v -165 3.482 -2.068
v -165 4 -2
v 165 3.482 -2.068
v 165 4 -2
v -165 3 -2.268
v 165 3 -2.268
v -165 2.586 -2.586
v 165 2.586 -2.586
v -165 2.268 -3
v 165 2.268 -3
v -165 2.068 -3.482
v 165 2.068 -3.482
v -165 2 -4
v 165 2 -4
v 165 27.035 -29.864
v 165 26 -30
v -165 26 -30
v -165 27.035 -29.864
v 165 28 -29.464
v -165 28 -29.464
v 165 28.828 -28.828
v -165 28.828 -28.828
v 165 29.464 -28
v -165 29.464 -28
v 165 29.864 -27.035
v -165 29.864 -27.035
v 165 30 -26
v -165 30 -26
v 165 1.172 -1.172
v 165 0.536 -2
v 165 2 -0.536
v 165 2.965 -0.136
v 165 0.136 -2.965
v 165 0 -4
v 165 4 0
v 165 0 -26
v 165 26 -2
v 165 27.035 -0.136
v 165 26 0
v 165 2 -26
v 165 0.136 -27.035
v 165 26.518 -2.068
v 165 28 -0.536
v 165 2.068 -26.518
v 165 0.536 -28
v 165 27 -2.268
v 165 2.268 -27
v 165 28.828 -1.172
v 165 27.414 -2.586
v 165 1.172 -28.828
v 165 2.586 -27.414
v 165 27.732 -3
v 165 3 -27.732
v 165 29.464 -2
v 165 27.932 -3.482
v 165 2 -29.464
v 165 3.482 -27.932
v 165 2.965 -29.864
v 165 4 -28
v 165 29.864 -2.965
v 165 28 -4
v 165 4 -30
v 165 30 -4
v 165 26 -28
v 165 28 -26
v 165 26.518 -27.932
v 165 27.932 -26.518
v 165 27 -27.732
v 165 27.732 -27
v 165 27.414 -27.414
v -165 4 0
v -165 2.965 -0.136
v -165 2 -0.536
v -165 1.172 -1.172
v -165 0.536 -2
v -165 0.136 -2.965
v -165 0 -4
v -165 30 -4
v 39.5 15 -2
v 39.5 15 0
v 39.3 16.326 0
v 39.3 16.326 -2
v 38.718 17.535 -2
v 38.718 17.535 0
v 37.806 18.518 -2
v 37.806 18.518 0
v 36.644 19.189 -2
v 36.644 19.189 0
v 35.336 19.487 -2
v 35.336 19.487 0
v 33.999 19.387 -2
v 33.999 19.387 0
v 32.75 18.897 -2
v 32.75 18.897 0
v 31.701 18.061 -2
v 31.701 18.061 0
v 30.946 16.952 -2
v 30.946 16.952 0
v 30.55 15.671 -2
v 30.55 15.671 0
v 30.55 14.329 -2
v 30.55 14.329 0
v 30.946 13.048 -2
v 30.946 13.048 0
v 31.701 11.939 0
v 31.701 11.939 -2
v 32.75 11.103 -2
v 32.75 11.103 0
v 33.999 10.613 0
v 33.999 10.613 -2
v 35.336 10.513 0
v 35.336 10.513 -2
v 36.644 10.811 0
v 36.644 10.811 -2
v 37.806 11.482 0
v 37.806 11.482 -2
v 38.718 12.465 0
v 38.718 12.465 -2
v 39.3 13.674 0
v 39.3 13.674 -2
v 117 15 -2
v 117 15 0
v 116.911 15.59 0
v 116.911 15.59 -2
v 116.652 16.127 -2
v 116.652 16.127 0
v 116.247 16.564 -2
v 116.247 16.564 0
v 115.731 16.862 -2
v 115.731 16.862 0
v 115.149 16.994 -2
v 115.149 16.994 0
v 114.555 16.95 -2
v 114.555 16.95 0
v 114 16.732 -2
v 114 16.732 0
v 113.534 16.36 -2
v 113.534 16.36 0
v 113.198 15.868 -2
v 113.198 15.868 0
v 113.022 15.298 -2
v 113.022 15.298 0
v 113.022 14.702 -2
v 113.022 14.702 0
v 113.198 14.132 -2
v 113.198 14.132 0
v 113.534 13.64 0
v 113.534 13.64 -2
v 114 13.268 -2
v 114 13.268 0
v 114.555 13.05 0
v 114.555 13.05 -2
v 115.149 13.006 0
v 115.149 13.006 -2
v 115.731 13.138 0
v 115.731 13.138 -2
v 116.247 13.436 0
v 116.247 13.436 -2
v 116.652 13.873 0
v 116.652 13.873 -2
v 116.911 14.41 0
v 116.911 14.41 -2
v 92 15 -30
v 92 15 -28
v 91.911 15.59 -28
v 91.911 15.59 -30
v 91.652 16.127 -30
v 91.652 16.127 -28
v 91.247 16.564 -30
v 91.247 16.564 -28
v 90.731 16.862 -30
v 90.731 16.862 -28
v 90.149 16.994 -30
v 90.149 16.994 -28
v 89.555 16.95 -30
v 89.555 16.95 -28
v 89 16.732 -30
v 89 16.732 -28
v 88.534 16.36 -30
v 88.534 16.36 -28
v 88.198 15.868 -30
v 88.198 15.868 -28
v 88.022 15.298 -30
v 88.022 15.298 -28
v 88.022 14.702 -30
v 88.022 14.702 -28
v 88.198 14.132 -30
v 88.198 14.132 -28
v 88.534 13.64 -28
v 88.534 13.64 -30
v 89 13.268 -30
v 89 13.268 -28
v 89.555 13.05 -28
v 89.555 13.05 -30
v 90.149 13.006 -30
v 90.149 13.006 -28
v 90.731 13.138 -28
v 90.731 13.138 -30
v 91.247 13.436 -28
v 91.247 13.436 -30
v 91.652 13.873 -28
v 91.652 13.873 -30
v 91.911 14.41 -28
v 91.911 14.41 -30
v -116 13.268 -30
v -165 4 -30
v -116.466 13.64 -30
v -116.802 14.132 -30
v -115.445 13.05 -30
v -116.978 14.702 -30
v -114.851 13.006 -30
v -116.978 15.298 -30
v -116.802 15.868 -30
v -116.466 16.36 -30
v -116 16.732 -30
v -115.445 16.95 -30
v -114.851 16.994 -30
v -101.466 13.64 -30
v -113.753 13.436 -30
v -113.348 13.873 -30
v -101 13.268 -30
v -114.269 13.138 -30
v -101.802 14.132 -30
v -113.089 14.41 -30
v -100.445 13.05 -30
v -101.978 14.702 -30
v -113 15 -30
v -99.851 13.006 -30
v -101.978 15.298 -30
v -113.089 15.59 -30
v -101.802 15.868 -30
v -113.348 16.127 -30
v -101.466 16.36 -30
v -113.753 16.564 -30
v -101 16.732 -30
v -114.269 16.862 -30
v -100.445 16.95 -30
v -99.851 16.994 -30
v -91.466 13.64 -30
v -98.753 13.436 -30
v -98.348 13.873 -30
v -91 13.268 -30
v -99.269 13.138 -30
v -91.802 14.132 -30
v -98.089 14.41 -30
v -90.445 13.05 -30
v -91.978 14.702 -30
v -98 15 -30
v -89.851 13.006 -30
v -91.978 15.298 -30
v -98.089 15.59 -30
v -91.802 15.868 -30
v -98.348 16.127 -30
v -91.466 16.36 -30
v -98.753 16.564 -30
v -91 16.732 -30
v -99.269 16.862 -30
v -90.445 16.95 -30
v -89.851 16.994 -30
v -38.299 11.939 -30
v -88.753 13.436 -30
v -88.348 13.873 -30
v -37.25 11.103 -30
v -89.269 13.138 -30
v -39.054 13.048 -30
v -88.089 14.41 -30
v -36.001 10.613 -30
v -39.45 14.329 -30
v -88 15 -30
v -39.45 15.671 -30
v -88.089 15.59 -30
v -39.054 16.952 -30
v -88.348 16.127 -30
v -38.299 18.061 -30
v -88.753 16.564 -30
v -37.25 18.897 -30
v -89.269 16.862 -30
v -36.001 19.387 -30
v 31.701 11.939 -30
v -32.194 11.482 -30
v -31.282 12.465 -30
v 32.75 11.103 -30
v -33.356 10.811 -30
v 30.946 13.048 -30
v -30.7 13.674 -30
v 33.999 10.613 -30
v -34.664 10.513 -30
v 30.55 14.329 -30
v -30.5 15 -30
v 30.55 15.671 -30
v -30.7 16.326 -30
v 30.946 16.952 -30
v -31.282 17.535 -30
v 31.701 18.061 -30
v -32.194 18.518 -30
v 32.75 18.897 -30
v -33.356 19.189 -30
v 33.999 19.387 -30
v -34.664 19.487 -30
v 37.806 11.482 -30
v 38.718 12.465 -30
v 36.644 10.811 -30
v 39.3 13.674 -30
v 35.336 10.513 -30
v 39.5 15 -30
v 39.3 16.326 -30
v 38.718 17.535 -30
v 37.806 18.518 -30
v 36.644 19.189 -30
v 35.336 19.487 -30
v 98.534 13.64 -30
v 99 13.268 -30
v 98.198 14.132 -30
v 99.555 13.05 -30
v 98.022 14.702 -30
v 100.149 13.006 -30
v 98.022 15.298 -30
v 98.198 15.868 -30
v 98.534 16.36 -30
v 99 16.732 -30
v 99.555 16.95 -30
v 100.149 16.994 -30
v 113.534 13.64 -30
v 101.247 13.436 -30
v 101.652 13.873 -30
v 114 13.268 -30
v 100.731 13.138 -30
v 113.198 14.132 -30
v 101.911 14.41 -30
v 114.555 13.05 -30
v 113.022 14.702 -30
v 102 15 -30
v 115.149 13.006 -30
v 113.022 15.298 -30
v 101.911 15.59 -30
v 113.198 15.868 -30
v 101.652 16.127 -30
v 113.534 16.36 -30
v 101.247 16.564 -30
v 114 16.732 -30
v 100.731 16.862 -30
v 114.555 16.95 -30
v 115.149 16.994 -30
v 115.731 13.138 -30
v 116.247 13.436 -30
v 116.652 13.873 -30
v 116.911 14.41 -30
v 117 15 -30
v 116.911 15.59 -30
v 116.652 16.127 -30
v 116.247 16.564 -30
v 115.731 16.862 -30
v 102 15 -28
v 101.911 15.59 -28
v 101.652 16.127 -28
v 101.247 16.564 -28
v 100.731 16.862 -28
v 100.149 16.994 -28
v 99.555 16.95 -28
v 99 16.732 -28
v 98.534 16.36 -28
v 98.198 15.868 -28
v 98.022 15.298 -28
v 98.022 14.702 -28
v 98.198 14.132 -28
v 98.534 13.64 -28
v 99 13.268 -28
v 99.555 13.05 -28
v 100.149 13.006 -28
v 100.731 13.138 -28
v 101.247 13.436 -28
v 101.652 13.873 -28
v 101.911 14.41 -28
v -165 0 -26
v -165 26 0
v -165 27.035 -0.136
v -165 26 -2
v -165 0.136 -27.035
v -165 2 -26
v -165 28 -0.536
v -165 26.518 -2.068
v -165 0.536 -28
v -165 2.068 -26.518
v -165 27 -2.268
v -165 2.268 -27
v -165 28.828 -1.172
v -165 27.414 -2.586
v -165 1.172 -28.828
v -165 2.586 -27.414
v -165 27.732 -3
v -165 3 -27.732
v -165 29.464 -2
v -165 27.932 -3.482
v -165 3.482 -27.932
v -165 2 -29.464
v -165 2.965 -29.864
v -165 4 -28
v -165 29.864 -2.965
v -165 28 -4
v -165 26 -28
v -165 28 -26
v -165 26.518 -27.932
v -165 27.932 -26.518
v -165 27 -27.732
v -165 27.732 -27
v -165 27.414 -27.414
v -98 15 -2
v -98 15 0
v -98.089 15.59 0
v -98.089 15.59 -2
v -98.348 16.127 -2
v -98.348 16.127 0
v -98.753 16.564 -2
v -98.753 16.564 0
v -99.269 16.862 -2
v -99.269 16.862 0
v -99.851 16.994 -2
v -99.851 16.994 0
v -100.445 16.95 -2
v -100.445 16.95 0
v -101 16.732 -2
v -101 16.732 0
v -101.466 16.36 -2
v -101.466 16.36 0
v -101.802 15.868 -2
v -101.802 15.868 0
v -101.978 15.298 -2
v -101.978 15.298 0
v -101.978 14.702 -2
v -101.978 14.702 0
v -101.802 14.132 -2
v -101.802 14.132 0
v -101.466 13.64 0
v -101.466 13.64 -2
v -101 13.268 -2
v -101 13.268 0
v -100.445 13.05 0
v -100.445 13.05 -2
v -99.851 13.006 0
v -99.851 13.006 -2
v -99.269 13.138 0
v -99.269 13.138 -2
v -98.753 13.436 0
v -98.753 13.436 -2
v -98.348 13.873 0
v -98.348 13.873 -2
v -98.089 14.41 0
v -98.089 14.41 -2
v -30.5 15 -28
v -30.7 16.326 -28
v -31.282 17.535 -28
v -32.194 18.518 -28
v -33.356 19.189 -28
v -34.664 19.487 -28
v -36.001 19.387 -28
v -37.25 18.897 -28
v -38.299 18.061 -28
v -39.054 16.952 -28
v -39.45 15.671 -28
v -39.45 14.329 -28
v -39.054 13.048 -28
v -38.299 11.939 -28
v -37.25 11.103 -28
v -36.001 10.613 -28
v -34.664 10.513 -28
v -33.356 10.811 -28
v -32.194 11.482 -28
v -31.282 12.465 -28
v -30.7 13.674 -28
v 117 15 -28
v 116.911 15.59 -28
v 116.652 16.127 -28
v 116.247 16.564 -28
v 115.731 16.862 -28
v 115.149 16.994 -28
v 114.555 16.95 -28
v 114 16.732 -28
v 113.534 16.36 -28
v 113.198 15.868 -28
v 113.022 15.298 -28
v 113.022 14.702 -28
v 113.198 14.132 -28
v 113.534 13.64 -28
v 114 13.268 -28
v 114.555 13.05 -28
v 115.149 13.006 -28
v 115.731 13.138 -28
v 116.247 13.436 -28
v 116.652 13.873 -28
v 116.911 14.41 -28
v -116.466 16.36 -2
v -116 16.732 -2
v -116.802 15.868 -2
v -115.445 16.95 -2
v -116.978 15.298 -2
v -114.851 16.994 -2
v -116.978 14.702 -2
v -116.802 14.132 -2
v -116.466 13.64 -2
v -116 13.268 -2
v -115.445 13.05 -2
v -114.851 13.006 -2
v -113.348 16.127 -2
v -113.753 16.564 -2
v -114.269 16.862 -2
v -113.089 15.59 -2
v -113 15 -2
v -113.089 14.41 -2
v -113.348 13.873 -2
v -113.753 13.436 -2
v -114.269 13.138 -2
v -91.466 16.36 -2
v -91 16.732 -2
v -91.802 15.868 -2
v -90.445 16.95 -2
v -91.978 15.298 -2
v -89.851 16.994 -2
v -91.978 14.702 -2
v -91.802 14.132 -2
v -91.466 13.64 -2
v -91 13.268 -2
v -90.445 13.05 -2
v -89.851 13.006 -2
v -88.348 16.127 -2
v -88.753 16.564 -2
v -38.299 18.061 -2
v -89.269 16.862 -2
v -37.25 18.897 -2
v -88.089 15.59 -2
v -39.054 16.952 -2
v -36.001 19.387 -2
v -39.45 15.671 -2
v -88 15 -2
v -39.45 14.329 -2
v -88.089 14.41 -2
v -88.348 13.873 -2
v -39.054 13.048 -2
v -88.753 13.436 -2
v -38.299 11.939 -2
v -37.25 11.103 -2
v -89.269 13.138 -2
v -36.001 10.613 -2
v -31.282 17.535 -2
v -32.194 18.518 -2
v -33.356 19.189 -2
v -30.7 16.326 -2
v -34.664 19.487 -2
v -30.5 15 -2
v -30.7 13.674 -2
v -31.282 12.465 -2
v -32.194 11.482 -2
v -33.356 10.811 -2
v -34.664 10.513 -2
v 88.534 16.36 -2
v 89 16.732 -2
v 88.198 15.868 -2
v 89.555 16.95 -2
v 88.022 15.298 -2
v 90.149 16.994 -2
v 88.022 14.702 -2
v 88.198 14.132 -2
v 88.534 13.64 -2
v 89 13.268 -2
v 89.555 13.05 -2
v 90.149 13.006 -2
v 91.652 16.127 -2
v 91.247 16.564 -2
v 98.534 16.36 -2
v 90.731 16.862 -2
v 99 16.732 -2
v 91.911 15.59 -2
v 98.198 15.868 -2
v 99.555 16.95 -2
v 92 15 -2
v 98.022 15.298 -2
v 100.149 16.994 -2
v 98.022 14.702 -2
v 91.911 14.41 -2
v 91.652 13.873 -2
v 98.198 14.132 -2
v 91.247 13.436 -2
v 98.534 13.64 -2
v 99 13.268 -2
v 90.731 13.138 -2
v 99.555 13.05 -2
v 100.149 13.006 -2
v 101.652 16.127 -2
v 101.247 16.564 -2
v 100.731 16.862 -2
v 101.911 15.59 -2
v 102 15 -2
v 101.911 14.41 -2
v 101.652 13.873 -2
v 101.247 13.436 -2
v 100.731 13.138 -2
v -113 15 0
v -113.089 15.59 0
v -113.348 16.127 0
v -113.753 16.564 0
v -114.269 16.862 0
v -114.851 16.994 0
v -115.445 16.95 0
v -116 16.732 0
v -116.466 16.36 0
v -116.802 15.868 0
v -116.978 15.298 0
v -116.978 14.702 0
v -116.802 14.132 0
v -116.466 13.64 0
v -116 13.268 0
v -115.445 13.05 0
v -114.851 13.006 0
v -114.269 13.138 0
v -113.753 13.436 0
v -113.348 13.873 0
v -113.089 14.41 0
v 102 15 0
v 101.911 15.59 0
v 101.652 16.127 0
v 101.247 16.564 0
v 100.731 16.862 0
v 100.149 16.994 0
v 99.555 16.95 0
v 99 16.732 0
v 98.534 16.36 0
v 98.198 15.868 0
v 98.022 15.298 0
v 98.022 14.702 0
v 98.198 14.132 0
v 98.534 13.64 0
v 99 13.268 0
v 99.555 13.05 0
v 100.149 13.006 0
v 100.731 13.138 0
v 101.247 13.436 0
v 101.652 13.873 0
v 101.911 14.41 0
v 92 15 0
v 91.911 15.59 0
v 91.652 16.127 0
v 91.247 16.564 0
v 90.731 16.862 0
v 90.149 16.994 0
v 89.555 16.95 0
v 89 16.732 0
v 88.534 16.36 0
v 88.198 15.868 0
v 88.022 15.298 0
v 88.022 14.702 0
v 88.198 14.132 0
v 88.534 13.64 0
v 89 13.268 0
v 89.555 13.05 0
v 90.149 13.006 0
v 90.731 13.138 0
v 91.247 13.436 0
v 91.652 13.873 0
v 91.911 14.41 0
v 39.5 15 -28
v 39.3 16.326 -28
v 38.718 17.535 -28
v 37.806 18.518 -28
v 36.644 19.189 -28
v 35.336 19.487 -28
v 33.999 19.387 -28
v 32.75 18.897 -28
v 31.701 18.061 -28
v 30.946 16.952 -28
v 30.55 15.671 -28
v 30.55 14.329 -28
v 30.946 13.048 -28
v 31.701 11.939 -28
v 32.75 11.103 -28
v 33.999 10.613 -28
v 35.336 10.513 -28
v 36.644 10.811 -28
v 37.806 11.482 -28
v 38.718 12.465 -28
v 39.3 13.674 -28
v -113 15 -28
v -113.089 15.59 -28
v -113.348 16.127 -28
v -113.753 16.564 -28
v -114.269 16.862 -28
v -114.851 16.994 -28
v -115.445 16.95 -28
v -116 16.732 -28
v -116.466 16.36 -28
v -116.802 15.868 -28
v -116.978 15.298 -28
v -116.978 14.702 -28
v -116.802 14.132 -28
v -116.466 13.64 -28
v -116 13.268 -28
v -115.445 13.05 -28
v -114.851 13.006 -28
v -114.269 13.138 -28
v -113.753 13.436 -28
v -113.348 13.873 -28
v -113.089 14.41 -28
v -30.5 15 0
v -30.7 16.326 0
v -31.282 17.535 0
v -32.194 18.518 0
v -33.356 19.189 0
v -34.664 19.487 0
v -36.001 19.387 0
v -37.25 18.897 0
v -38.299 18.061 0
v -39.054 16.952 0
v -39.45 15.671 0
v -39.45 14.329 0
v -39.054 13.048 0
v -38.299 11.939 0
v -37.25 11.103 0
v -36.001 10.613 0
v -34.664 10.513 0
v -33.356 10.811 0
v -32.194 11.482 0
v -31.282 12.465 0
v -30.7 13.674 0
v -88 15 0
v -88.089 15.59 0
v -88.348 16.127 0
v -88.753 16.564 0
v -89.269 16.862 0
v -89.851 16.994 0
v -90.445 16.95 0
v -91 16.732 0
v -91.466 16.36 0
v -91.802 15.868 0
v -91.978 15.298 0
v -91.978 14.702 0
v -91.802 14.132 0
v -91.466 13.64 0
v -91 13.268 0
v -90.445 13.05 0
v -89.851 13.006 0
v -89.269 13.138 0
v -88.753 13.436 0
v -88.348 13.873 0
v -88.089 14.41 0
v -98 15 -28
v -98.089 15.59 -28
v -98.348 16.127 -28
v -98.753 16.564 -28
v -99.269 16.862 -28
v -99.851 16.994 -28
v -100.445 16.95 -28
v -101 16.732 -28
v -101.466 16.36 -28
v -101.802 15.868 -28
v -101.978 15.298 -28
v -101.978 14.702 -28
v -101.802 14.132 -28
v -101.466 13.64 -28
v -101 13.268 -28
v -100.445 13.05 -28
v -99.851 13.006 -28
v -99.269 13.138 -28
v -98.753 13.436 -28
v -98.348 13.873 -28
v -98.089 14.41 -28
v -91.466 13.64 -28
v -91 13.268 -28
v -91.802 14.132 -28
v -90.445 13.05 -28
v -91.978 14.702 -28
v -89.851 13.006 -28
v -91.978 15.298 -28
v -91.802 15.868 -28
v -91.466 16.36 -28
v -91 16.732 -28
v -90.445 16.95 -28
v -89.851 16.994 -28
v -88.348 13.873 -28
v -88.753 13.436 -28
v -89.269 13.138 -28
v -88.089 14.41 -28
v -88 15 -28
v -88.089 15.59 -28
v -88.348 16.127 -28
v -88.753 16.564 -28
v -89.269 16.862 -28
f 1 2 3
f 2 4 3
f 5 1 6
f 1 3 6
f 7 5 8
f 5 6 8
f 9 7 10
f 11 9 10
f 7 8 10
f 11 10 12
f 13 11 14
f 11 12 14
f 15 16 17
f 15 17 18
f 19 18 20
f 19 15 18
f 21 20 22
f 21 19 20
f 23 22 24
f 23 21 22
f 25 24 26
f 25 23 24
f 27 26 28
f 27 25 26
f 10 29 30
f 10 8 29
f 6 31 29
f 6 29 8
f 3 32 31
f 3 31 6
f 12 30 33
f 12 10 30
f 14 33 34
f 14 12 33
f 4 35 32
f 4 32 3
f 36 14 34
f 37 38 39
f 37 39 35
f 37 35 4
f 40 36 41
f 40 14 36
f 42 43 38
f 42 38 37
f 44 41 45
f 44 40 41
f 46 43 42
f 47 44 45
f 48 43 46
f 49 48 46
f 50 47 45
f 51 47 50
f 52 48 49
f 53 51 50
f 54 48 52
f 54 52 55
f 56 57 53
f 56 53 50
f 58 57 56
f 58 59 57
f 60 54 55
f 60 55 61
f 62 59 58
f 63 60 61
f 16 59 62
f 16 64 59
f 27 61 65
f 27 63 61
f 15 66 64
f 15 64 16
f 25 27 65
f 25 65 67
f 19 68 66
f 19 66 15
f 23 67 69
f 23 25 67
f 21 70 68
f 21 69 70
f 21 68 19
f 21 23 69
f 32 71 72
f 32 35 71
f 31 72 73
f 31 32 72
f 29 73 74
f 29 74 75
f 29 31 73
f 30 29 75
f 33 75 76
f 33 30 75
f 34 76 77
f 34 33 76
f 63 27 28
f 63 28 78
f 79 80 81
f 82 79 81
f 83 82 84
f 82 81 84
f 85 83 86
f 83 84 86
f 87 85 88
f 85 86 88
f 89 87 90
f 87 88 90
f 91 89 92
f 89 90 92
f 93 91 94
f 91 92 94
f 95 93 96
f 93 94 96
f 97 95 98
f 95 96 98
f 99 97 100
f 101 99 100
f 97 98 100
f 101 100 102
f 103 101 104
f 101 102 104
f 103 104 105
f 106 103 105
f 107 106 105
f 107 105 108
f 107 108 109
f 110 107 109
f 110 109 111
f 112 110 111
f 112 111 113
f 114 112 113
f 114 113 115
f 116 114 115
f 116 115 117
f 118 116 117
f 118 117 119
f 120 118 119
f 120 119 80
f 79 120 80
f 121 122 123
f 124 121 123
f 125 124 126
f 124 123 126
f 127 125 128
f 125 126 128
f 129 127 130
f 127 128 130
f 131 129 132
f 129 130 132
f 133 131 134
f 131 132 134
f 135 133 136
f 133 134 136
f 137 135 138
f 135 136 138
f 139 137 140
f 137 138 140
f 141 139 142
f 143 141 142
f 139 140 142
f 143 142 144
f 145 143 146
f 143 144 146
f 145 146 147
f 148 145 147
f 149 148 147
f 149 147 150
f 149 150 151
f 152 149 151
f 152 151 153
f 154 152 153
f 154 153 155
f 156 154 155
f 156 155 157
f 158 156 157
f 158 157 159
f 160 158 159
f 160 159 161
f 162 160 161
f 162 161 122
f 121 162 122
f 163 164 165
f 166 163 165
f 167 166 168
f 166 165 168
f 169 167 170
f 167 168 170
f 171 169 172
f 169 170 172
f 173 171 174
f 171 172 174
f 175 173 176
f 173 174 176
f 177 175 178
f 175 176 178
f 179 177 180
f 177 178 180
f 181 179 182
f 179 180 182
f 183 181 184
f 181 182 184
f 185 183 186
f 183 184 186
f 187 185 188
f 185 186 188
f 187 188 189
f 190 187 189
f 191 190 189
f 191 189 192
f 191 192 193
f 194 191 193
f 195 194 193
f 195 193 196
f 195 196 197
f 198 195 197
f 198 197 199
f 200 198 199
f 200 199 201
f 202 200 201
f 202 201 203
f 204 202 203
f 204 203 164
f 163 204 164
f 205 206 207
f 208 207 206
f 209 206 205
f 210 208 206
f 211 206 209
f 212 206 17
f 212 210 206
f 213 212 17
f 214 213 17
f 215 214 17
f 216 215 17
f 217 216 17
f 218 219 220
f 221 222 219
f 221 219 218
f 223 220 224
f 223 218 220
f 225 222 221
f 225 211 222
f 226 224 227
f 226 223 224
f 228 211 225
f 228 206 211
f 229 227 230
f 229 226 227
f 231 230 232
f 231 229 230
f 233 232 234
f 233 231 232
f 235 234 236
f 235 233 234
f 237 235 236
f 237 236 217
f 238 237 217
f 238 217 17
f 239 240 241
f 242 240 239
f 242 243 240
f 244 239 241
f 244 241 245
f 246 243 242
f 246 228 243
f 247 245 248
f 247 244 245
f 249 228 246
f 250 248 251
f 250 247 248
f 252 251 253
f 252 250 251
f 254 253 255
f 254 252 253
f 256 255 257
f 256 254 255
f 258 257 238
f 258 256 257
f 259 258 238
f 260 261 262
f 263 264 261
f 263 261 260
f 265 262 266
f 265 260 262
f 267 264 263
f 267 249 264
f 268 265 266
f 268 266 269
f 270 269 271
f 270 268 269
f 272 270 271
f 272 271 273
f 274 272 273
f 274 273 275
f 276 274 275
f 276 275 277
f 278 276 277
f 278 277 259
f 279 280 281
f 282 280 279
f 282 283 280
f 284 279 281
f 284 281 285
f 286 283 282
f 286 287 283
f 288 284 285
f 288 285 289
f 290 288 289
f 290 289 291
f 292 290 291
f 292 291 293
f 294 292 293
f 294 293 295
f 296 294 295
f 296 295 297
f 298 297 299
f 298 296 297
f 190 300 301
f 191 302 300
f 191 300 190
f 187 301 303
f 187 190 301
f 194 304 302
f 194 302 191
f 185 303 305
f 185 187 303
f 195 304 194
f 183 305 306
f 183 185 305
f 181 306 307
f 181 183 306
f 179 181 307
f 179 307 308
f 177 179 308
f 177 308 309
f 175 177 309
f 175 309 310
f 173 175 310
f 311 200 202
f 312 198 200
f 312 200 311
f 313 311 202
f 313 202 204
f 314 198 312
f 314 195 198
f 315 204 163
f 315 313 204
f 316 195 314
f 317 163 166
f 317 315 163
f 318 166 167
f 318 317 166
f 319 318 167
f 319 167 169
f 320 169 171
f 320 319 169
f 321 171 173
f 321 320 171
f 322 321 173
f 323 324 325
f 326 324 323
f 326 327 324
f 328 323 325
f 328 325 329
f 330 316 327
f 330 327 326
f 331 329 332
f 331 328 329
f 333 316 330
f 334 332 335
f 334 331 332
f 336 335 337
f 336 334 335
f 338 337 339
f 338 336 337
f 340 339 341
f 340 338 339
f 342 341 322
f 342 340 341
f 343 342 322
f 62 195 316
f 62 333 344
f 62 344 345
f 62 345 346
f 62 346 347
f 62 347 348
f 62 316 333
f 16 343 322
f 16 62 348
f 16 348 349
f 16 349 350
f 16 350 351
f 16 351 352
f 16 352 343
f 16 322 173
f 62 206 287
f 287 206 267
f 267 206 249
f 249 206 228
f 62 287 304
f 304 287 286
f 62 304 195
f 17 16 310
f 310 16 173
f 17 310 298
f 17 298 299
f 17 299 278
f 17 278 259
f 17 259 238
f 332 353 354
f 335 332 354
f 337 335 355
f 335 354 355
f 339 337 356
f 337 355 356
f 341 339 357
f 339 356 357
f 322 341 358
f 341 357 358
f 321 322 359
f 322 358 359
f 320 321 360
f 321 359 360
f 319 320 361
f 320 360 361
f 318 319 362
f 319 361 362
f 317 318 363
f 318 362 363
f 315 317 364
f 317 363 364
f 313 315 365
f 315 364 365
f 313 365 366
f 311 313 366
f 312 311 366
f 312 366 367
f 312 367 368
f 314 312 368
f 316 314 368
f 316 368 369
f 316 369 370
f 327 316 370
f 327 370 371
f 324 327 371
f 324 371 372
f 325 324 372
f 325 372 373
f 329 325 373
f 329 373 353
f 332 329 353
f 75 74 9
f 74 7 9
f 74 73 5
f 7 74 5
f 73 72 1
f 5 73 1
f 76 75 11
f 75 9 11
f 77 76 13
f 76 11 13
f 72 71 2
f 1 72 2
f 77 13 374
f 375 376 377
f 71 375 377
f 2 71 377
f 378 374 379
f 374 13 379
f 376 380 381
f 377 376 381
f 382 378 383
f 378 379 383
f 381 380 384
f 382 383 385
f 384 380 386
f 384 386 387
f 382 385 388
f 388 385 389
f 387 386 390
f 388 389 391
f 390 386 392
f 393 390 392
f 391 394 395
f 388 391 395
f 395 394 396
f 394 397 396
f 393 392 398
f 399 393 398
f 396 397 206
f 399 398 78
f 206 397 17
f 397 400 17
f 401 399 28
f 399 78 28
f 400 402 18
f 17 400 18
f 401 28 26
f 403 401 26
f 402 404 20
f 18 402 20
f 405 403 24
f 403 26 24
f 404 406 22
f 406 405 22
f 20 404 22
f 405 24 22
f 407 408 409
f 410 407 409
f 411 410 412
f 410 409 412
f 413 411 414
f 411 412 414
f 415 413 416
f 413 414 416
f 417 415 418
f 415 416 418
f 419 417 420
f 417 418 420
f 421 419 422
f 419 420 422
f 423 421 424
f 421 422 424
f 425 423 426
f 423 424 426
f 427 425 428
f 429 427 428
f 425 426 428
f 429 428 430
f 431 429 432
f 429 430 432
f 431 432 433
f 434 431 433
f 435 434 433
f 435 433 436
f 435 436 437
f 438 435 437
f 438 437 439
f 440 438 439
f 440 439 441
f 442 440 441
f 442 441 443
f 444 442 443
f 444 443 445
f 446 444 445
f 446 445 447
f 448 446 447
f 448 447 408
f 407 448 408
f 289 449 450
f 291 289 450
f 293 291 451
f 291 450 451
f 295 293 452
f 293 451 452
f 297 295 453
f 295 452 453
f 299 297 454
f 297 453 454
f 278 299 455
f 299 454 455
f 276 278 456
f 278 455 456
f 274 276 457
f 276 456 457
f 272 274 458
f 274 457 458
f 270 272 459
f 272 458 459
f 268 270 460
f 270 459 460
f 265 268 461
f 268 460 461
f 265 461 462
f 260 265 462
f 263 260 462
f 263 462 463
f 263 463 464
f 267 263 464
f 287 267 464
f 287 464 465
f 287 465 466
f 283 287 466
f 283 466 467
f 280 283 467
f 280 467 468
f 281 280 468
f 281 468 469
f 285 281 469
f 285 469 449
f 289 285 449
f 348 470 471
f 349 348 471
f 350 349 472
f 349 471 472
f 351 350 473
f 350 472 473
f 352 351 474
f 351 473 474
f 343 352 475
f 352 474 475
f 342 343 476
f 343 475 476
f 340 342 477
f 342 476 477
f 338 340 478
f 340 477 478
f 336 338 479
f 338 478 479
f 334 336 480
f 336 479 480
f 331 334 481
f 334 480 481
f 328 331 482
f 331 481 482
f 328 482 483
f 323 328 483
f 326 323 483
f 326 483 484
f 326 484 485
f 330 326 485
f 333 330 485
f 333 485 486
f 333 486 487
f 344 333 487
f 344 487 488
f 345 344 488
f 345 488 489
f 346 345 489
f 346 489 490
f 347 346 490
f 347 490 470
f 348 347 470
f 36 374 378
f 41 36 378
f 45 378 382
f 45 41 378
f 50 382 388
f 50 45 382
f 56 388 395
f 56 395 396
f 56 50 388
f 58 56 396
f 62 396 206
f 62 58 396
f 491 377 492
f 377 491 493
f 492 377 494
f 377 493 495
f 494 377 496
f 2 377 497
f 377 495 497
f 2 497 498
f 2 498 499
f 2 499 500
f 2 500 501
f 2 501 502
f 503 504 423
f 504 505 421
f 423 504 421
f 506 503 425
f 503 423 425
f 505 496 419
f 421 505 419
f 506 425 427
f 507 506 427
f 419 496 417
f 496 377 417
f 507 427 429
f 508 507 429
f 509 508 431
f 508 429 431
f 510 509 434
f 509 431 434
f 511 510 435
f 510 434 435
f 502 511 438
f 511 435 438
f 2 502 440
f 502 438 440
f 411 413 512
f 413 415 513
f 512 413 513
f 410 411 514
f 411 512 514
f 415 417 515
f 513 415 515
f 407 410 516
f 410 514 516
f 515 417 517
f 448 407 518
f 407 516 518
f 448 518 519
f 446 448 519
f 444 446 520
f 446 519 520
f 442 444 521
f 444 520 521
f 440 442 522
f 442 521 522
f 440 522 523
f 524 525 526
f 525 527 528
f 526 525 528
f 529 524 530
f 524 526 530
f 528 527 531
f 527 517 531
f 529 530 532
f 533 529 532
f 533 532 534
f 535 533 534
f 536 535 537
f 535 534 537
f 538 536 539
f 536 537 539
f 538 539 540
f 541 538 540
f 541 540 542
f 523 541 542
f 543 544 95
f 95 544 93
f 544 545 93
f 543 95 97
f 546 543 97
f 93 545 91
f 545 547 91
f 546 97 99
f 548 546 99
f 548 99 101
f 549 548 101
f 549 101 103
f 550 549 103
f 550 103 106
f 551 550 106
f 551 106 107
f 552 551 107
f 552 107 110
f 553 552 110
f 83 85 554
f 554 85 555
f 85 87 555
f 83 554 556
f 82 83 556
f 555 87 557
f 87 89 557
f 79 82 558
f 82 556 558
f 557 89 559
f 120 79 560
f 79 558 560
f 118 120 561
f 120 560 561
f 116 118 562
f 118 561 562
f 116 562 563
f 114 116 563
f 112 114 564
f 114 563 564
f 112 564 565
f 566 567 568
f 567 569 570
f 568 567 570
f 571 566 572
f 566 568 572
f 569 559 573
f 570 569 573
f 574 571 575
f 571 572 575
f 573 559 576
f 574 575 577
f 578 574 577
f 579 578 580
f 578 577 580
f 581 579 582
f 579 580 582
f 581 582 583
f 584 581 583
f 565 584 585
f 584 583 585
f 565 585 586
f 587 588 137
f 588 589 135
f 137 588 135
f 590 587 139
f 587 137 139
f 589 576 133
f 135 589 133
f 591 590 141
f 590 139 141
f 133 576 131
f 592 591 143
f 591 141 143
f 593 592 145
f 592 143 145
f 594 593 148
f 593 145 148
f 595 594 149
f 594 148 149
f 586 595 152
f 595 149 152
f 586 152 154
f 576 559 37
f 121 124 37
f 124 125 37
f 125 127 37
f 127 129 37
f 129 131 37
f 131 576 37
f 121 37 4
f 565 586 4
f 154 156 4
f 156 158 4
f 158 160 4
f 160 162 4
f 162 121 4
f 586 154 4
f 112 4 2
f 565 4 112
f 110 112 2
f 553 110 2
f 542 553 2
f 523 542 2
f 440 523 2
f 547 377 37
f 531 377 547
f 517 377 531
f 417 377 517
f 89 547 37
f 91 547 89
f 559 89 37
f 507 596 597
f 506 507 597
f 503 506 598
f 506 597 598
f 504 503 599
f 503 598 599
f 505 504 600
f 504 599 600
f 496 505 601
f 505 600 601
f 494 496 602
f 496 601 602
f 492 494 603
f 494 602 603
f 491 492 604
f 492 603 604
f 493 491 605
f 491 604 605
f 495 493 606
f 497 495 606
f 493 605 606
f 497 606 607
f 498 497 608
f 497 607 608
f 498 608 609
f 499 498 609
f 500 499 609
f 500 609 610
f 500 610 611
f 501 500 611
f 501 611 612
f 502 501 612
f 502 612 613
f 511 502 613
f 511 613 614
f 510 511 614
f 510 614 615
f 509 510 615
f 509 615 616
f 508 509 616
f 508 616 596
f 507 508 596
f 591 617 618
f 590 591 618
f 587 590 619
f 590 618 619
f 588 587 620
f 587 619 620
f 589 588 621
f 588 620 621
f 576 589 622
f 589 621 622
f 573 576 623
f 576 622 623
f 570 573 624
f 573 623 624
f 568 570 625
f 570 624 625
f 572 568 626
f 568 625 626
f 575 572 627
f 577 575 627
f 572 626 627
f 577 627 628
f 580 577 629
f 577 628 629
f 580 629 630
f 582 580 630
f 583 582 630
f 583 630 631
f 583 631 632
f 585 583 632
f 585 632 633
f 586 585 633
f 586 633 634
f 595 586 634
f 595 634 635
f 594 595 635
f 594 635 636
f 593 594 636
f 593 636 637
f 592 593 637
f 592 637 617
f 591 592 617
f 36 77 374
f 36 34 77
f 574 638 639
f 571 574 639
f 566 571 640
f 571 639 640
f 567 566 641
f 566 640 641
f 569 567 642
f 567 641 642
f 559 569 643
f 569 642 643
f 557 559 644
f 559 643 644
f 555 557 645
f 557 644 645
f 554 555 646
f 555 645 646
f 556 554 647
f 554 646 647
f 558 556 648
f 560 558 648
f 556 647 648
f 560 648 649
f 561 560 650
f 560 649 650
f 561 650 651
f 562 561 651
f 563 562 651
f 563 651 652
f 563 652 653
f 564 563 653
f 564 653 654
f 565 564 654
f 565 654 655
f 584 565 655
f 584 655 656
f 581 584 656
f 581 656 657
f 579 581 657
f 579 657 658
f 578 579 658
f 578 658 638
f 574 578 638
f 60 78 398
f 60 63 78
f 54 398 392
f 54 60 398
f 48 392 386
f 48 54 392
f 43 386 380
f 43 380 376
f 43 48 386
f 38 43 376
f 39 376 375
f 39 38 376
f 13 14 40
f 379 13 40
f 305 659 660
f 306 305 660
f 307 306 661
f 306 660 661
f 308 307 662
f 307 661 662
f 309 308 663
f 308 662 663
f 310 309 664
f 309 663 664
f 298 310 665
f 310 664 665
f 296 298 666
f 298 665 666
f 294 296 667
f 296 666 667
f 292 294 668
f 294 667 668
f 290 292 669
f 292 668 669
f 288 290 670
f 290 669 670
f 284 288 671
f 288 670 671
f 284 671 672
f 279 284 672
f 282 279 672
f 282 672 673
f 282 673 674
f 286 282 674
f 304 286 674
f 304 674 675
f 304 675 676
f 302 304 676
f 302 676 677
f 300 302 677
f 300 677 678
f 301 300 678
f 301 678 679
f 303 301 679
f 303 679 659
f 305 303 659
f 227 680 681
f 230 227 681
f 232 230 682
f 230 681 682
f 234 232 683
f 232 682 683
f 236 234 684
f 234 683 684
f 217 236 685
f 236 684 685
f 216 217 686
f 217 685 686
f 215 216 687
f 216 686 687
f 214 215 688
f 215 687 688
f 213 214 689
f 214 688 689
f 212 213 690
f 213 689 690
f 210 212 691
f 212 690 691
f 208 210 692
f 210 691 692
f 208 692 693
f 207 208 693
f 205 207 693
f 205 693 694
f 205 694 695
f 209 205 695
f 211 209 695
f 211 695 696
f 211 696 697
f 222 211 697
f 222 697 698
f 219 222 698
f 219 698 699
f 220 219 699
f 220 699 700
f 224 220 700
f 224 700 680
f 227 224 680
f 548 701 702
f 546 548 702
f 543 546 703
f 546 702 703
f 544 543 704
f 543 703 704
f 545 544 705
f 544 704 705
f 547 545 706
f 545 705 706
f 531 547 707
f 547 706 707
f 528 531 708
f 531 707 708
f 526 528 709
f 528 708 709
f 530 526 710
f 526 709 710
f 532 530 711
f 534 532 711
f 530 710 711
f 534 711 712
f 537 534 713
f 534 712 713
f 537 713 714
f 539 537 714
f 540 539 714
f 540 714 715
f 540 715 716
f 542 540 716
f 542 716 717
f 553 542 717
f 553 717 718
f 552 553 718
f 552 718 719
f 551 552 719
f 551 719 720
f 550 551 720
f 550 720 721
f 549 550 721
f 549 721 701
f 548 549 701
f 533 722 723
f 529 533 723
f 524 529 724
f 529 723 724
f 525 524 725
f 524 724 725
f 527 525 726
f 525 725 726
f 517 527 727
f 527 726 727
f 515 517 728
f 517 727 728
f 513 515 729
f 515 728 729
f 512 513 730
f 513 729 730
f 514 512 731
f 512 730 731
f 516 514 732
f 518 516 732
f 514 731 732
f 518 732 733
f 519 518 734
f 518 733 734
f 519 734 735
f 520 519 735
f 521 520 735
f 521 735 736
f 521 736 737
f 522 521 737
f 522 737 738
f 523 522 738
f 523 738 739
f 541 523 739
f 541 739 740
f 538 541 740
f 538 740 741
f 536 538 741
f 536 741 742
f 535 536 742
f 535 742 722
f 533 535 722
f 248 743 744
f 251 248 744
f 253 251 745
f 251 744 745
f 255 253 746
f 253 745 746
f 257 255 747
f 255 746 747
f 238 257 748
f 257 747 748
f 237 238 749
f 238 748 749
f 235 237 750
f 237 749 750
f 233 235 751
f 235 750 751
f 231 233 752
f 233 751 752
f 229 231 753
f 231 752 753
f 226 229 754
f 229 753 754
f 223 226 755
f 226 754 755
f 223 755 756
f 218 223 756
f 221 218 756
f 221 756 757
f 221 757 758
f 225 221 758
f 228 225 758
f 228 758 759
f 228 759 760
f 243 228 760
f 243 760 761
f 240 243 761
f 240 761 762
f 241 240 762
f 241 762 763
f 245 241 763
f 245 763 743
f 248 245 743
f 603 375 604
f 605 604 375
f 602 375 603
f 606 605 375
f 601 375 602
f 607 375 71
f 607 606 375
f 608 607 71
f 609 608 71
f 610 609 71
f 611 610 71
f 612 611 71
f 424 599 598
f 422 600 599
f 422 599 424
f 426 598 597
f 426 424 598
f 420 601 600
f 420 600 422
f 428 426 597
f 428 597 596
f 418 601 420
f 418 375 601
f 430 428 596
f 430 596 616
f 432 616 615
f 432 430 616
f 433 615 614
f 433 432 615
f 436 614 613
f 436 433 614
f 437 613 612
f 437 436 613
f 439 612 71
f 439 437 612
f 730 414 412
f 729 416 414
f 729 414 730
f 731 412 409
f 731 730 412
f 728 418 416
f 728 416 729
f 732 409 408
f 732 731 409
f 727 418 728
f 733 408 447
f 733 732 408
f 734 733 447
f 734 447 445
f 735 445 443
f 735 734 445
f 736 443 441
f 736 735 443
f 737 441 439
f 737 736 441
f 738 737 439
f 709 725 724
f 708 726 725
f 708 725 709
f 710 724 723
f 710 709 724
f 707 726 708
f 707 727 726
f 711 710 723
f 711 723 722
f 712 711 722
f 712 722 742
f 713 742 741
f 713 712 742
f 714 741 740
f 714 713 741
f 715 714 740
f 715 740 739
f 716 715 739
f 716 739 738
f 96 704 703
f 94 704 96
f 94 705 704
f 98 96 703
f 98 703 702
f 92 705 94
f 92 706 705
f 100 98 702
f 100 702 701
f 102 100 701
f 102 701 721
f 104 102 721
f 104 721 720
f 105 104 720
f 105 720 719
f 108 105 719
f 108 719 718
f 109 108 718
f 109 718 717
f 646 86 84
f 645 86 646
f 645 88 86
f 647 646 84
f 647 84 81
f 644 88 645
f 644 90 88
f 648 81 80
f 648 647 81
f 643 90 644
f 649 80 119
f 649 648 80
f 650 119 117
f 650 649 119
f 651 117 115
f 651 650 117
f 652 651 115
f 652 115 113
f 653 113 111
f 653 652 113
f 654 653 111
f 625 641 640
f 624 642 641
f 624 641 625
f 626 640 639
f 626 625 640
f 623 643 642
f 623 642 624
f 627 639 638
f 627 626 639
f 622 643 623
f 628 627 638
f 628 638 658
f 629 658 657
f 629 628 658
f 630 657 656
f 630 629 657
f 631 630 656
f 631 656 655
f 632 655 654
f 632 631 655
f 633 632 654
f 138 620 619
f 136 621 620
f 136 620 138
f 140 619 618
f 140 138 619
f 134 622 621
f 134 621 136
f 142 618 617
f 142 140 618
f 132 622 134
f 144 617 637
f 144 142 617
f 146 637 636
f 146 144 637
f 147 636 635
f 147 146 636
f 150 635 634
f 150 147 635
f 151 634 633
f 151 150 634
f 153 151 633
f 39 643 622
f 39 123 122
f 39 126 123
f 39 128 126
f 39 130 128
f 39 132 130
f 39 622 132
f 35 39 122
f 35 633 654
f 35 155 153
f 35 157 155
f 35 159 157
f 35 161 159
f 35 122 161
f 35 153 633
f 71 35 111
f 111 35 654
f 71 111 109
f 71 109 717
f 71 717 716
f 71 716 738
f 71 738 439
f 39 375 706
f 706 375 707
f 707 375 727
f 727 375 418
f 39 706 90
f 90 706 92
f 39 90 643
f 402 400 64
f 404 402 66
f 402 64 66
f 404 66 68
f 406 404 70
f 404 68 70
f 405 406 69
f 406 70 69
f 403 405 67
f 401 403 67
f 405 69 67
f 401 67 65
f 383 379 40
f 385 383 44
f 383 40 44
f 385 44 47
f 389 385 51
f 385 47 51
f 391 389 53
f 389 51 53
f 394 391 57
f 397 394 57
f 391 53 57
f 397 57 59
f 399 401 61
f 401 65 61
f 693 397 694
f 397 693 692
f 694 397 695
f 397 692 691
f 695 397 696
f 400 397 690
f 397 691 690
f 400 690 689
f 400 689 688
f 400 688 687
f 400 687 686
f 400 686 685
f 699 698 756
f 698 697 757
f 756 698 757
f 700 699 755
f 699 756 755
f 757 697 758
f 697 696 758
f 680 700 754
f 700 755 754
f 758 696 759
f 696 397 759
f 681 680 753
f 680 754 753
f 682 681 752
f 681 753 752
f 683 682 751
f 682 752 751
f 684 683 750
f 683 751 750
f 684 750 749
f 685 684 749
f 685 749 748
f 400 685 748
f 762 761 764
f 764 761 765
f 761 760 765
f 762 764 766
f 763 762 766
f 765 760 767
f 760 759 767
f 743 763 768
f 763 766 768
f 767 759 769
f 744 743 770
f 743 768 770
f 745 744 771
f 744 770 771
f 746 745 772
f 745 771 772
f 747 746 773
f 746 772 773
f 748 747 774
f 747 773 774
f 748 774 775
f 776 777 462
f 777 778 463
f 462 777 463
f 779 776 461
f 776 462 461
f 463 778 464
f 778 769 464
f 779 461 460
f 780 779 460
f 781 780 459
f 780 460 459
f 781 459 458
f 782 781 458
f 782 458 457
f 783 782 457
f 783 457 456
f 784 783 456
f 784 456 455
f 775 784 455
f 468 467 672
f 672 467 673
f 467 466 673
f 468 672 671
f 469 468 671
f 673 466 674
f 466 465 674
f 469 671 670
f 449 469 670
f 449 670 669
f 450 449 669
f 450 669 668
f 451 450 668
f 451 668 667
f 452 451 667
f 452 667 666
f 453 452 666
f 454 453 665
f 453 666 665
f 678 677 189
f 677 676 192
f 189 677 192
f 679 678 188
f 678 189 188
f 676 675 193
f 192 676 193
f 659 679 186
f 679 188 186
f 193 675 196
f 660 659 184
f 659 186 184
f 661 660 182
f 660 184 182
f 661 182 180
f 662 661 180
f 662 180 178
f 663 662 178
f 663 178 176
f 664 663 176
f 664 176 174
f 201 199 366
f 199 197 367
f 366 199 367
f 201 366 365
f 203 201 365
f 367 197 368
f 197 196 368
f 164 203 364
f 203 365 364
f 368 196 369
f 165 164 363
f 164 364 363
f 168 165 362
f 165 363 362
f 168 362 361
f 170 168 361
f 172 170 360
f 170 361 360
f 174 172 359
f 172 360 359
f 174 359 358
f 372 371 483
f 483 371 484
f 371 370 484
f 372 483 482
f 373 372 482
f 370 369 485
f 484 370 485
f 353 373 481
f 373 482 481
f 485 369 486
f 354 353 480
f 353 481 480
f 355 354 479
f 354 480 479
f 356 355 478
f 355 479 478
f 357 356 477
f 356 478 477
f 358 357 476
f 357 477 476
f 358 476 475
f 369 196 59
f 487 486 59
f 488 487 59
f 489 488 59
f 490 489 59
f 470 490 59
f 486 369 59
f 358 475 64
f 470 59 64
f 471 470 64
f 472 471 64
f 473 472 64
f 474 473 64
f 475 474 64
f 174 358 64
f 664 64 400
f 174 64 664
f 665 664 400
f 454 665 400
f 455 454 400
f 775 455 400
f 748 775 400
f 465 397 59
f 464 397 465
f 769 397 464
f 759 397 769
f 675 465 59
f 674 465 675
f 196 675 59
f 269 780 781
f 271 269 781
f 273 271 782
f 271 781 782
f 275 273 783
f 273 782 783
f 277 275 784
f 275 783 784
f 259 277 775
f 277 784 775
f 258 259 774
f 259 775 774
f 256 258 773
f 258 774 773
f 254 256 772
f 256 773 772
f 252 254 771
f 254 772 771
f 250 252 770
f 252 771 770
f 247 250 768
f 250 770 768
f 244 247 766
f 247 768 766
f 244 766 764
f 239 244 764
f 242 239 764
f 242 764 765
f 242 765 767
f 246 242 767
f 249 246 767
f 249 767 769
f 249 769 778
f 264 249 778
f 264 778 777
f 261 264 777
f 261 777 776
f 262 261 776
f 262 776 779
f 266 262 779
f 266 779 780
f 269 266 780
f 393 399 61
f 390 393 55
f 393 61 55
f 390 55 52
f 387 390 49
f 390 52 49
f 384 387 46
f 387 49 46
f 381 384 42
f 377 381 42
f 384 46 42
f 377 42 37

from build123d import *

# Parameters (mm, degrees)
EXTRUDE_1_DEPTH     = 165
SKETCH_2_R          = 4.5
SKETCH_2_R_2        = 2
CUT_EXTRUDE_1_DEPTH = 171.367250374


with BuildPart() as part:
    # 草图1 → 凸台-拉伸1 (new, symmetric)
    with BuildSketch(Plane(origin=(0, 0, 0), x_dir=(0, 0, -1), z_dir=(1, 0, 0))):
        with BuildLine():
            Line((4, 0), (26, 0))
            ThreePointArc((26, 0), (28.828427125, 1.171572875), (30, 4))
            Line((30, 4), (30, 26))
            ThreePointArc((30, 26), (28.828427125, 28.828427125), (26, 30))
            Line((26, 30), (4, 30))
            ThreePointArc((4, 30), (1.171572875, 28.828427125), (0, 26))
            Line((0, 26), (0, 4))
            ThreePointArc((0, 4), (1.171572875, 1.171572875), (4, 0))
        make_face()
        with BuildLine():
            Line((4, 2), (26, 2))
            ThreePointArc((26, 2), (27.414213562, 2.585786438), (28, 4))
            Line((28, 4), (28, 26))
            ThreePointArc((28, 26), (27.414213562, 27.414213562), (26, 28))
            Line((26, 28), (4, 28))
            ThreePointArc((4, 28), (2.585786438, 27.414213562), (2, 26))
            Line((2, 26), (2, 4))
            ThreePointArc((2, 4), (2.585786438, 2.585786438), (4, 2))
        make_face(mode=Mode.SUBTRACT)
    extrude(amount=EXTRUDE_1_DEPTH, both=True)

    # 草图2 → 切除-拉伸1 (cut, through all)
    with BuildSketch(Plane.XY):
        with Locations((-35, 15)):
            Circle(SKETCH_2_R)
        with Locations((35, 15)):
            Circle(SKETCH_2_R)
        with Locations((-115, 15)):
            Circle(SKETCH_2_R_2)
        with Locations((115, 15)):
            Circle(SKETCH_2_R_2)
        with Locations((-100, 15)):
            Circle(SKETCH_2_R_2)
        with Locations((-90, 15)):
            Circle(SKETCH_2_R_2)
        with Locations((90, 15)):
            Circle(SKETCH_2_R_2)
        with Locations((100, 15)):
            Circle(SKETCH_2_R_2)
    extrude(amount=-CUT_EXTRUDE_1_DEPTH, mode=Mode.SUBTRACT)


solid = part.part
